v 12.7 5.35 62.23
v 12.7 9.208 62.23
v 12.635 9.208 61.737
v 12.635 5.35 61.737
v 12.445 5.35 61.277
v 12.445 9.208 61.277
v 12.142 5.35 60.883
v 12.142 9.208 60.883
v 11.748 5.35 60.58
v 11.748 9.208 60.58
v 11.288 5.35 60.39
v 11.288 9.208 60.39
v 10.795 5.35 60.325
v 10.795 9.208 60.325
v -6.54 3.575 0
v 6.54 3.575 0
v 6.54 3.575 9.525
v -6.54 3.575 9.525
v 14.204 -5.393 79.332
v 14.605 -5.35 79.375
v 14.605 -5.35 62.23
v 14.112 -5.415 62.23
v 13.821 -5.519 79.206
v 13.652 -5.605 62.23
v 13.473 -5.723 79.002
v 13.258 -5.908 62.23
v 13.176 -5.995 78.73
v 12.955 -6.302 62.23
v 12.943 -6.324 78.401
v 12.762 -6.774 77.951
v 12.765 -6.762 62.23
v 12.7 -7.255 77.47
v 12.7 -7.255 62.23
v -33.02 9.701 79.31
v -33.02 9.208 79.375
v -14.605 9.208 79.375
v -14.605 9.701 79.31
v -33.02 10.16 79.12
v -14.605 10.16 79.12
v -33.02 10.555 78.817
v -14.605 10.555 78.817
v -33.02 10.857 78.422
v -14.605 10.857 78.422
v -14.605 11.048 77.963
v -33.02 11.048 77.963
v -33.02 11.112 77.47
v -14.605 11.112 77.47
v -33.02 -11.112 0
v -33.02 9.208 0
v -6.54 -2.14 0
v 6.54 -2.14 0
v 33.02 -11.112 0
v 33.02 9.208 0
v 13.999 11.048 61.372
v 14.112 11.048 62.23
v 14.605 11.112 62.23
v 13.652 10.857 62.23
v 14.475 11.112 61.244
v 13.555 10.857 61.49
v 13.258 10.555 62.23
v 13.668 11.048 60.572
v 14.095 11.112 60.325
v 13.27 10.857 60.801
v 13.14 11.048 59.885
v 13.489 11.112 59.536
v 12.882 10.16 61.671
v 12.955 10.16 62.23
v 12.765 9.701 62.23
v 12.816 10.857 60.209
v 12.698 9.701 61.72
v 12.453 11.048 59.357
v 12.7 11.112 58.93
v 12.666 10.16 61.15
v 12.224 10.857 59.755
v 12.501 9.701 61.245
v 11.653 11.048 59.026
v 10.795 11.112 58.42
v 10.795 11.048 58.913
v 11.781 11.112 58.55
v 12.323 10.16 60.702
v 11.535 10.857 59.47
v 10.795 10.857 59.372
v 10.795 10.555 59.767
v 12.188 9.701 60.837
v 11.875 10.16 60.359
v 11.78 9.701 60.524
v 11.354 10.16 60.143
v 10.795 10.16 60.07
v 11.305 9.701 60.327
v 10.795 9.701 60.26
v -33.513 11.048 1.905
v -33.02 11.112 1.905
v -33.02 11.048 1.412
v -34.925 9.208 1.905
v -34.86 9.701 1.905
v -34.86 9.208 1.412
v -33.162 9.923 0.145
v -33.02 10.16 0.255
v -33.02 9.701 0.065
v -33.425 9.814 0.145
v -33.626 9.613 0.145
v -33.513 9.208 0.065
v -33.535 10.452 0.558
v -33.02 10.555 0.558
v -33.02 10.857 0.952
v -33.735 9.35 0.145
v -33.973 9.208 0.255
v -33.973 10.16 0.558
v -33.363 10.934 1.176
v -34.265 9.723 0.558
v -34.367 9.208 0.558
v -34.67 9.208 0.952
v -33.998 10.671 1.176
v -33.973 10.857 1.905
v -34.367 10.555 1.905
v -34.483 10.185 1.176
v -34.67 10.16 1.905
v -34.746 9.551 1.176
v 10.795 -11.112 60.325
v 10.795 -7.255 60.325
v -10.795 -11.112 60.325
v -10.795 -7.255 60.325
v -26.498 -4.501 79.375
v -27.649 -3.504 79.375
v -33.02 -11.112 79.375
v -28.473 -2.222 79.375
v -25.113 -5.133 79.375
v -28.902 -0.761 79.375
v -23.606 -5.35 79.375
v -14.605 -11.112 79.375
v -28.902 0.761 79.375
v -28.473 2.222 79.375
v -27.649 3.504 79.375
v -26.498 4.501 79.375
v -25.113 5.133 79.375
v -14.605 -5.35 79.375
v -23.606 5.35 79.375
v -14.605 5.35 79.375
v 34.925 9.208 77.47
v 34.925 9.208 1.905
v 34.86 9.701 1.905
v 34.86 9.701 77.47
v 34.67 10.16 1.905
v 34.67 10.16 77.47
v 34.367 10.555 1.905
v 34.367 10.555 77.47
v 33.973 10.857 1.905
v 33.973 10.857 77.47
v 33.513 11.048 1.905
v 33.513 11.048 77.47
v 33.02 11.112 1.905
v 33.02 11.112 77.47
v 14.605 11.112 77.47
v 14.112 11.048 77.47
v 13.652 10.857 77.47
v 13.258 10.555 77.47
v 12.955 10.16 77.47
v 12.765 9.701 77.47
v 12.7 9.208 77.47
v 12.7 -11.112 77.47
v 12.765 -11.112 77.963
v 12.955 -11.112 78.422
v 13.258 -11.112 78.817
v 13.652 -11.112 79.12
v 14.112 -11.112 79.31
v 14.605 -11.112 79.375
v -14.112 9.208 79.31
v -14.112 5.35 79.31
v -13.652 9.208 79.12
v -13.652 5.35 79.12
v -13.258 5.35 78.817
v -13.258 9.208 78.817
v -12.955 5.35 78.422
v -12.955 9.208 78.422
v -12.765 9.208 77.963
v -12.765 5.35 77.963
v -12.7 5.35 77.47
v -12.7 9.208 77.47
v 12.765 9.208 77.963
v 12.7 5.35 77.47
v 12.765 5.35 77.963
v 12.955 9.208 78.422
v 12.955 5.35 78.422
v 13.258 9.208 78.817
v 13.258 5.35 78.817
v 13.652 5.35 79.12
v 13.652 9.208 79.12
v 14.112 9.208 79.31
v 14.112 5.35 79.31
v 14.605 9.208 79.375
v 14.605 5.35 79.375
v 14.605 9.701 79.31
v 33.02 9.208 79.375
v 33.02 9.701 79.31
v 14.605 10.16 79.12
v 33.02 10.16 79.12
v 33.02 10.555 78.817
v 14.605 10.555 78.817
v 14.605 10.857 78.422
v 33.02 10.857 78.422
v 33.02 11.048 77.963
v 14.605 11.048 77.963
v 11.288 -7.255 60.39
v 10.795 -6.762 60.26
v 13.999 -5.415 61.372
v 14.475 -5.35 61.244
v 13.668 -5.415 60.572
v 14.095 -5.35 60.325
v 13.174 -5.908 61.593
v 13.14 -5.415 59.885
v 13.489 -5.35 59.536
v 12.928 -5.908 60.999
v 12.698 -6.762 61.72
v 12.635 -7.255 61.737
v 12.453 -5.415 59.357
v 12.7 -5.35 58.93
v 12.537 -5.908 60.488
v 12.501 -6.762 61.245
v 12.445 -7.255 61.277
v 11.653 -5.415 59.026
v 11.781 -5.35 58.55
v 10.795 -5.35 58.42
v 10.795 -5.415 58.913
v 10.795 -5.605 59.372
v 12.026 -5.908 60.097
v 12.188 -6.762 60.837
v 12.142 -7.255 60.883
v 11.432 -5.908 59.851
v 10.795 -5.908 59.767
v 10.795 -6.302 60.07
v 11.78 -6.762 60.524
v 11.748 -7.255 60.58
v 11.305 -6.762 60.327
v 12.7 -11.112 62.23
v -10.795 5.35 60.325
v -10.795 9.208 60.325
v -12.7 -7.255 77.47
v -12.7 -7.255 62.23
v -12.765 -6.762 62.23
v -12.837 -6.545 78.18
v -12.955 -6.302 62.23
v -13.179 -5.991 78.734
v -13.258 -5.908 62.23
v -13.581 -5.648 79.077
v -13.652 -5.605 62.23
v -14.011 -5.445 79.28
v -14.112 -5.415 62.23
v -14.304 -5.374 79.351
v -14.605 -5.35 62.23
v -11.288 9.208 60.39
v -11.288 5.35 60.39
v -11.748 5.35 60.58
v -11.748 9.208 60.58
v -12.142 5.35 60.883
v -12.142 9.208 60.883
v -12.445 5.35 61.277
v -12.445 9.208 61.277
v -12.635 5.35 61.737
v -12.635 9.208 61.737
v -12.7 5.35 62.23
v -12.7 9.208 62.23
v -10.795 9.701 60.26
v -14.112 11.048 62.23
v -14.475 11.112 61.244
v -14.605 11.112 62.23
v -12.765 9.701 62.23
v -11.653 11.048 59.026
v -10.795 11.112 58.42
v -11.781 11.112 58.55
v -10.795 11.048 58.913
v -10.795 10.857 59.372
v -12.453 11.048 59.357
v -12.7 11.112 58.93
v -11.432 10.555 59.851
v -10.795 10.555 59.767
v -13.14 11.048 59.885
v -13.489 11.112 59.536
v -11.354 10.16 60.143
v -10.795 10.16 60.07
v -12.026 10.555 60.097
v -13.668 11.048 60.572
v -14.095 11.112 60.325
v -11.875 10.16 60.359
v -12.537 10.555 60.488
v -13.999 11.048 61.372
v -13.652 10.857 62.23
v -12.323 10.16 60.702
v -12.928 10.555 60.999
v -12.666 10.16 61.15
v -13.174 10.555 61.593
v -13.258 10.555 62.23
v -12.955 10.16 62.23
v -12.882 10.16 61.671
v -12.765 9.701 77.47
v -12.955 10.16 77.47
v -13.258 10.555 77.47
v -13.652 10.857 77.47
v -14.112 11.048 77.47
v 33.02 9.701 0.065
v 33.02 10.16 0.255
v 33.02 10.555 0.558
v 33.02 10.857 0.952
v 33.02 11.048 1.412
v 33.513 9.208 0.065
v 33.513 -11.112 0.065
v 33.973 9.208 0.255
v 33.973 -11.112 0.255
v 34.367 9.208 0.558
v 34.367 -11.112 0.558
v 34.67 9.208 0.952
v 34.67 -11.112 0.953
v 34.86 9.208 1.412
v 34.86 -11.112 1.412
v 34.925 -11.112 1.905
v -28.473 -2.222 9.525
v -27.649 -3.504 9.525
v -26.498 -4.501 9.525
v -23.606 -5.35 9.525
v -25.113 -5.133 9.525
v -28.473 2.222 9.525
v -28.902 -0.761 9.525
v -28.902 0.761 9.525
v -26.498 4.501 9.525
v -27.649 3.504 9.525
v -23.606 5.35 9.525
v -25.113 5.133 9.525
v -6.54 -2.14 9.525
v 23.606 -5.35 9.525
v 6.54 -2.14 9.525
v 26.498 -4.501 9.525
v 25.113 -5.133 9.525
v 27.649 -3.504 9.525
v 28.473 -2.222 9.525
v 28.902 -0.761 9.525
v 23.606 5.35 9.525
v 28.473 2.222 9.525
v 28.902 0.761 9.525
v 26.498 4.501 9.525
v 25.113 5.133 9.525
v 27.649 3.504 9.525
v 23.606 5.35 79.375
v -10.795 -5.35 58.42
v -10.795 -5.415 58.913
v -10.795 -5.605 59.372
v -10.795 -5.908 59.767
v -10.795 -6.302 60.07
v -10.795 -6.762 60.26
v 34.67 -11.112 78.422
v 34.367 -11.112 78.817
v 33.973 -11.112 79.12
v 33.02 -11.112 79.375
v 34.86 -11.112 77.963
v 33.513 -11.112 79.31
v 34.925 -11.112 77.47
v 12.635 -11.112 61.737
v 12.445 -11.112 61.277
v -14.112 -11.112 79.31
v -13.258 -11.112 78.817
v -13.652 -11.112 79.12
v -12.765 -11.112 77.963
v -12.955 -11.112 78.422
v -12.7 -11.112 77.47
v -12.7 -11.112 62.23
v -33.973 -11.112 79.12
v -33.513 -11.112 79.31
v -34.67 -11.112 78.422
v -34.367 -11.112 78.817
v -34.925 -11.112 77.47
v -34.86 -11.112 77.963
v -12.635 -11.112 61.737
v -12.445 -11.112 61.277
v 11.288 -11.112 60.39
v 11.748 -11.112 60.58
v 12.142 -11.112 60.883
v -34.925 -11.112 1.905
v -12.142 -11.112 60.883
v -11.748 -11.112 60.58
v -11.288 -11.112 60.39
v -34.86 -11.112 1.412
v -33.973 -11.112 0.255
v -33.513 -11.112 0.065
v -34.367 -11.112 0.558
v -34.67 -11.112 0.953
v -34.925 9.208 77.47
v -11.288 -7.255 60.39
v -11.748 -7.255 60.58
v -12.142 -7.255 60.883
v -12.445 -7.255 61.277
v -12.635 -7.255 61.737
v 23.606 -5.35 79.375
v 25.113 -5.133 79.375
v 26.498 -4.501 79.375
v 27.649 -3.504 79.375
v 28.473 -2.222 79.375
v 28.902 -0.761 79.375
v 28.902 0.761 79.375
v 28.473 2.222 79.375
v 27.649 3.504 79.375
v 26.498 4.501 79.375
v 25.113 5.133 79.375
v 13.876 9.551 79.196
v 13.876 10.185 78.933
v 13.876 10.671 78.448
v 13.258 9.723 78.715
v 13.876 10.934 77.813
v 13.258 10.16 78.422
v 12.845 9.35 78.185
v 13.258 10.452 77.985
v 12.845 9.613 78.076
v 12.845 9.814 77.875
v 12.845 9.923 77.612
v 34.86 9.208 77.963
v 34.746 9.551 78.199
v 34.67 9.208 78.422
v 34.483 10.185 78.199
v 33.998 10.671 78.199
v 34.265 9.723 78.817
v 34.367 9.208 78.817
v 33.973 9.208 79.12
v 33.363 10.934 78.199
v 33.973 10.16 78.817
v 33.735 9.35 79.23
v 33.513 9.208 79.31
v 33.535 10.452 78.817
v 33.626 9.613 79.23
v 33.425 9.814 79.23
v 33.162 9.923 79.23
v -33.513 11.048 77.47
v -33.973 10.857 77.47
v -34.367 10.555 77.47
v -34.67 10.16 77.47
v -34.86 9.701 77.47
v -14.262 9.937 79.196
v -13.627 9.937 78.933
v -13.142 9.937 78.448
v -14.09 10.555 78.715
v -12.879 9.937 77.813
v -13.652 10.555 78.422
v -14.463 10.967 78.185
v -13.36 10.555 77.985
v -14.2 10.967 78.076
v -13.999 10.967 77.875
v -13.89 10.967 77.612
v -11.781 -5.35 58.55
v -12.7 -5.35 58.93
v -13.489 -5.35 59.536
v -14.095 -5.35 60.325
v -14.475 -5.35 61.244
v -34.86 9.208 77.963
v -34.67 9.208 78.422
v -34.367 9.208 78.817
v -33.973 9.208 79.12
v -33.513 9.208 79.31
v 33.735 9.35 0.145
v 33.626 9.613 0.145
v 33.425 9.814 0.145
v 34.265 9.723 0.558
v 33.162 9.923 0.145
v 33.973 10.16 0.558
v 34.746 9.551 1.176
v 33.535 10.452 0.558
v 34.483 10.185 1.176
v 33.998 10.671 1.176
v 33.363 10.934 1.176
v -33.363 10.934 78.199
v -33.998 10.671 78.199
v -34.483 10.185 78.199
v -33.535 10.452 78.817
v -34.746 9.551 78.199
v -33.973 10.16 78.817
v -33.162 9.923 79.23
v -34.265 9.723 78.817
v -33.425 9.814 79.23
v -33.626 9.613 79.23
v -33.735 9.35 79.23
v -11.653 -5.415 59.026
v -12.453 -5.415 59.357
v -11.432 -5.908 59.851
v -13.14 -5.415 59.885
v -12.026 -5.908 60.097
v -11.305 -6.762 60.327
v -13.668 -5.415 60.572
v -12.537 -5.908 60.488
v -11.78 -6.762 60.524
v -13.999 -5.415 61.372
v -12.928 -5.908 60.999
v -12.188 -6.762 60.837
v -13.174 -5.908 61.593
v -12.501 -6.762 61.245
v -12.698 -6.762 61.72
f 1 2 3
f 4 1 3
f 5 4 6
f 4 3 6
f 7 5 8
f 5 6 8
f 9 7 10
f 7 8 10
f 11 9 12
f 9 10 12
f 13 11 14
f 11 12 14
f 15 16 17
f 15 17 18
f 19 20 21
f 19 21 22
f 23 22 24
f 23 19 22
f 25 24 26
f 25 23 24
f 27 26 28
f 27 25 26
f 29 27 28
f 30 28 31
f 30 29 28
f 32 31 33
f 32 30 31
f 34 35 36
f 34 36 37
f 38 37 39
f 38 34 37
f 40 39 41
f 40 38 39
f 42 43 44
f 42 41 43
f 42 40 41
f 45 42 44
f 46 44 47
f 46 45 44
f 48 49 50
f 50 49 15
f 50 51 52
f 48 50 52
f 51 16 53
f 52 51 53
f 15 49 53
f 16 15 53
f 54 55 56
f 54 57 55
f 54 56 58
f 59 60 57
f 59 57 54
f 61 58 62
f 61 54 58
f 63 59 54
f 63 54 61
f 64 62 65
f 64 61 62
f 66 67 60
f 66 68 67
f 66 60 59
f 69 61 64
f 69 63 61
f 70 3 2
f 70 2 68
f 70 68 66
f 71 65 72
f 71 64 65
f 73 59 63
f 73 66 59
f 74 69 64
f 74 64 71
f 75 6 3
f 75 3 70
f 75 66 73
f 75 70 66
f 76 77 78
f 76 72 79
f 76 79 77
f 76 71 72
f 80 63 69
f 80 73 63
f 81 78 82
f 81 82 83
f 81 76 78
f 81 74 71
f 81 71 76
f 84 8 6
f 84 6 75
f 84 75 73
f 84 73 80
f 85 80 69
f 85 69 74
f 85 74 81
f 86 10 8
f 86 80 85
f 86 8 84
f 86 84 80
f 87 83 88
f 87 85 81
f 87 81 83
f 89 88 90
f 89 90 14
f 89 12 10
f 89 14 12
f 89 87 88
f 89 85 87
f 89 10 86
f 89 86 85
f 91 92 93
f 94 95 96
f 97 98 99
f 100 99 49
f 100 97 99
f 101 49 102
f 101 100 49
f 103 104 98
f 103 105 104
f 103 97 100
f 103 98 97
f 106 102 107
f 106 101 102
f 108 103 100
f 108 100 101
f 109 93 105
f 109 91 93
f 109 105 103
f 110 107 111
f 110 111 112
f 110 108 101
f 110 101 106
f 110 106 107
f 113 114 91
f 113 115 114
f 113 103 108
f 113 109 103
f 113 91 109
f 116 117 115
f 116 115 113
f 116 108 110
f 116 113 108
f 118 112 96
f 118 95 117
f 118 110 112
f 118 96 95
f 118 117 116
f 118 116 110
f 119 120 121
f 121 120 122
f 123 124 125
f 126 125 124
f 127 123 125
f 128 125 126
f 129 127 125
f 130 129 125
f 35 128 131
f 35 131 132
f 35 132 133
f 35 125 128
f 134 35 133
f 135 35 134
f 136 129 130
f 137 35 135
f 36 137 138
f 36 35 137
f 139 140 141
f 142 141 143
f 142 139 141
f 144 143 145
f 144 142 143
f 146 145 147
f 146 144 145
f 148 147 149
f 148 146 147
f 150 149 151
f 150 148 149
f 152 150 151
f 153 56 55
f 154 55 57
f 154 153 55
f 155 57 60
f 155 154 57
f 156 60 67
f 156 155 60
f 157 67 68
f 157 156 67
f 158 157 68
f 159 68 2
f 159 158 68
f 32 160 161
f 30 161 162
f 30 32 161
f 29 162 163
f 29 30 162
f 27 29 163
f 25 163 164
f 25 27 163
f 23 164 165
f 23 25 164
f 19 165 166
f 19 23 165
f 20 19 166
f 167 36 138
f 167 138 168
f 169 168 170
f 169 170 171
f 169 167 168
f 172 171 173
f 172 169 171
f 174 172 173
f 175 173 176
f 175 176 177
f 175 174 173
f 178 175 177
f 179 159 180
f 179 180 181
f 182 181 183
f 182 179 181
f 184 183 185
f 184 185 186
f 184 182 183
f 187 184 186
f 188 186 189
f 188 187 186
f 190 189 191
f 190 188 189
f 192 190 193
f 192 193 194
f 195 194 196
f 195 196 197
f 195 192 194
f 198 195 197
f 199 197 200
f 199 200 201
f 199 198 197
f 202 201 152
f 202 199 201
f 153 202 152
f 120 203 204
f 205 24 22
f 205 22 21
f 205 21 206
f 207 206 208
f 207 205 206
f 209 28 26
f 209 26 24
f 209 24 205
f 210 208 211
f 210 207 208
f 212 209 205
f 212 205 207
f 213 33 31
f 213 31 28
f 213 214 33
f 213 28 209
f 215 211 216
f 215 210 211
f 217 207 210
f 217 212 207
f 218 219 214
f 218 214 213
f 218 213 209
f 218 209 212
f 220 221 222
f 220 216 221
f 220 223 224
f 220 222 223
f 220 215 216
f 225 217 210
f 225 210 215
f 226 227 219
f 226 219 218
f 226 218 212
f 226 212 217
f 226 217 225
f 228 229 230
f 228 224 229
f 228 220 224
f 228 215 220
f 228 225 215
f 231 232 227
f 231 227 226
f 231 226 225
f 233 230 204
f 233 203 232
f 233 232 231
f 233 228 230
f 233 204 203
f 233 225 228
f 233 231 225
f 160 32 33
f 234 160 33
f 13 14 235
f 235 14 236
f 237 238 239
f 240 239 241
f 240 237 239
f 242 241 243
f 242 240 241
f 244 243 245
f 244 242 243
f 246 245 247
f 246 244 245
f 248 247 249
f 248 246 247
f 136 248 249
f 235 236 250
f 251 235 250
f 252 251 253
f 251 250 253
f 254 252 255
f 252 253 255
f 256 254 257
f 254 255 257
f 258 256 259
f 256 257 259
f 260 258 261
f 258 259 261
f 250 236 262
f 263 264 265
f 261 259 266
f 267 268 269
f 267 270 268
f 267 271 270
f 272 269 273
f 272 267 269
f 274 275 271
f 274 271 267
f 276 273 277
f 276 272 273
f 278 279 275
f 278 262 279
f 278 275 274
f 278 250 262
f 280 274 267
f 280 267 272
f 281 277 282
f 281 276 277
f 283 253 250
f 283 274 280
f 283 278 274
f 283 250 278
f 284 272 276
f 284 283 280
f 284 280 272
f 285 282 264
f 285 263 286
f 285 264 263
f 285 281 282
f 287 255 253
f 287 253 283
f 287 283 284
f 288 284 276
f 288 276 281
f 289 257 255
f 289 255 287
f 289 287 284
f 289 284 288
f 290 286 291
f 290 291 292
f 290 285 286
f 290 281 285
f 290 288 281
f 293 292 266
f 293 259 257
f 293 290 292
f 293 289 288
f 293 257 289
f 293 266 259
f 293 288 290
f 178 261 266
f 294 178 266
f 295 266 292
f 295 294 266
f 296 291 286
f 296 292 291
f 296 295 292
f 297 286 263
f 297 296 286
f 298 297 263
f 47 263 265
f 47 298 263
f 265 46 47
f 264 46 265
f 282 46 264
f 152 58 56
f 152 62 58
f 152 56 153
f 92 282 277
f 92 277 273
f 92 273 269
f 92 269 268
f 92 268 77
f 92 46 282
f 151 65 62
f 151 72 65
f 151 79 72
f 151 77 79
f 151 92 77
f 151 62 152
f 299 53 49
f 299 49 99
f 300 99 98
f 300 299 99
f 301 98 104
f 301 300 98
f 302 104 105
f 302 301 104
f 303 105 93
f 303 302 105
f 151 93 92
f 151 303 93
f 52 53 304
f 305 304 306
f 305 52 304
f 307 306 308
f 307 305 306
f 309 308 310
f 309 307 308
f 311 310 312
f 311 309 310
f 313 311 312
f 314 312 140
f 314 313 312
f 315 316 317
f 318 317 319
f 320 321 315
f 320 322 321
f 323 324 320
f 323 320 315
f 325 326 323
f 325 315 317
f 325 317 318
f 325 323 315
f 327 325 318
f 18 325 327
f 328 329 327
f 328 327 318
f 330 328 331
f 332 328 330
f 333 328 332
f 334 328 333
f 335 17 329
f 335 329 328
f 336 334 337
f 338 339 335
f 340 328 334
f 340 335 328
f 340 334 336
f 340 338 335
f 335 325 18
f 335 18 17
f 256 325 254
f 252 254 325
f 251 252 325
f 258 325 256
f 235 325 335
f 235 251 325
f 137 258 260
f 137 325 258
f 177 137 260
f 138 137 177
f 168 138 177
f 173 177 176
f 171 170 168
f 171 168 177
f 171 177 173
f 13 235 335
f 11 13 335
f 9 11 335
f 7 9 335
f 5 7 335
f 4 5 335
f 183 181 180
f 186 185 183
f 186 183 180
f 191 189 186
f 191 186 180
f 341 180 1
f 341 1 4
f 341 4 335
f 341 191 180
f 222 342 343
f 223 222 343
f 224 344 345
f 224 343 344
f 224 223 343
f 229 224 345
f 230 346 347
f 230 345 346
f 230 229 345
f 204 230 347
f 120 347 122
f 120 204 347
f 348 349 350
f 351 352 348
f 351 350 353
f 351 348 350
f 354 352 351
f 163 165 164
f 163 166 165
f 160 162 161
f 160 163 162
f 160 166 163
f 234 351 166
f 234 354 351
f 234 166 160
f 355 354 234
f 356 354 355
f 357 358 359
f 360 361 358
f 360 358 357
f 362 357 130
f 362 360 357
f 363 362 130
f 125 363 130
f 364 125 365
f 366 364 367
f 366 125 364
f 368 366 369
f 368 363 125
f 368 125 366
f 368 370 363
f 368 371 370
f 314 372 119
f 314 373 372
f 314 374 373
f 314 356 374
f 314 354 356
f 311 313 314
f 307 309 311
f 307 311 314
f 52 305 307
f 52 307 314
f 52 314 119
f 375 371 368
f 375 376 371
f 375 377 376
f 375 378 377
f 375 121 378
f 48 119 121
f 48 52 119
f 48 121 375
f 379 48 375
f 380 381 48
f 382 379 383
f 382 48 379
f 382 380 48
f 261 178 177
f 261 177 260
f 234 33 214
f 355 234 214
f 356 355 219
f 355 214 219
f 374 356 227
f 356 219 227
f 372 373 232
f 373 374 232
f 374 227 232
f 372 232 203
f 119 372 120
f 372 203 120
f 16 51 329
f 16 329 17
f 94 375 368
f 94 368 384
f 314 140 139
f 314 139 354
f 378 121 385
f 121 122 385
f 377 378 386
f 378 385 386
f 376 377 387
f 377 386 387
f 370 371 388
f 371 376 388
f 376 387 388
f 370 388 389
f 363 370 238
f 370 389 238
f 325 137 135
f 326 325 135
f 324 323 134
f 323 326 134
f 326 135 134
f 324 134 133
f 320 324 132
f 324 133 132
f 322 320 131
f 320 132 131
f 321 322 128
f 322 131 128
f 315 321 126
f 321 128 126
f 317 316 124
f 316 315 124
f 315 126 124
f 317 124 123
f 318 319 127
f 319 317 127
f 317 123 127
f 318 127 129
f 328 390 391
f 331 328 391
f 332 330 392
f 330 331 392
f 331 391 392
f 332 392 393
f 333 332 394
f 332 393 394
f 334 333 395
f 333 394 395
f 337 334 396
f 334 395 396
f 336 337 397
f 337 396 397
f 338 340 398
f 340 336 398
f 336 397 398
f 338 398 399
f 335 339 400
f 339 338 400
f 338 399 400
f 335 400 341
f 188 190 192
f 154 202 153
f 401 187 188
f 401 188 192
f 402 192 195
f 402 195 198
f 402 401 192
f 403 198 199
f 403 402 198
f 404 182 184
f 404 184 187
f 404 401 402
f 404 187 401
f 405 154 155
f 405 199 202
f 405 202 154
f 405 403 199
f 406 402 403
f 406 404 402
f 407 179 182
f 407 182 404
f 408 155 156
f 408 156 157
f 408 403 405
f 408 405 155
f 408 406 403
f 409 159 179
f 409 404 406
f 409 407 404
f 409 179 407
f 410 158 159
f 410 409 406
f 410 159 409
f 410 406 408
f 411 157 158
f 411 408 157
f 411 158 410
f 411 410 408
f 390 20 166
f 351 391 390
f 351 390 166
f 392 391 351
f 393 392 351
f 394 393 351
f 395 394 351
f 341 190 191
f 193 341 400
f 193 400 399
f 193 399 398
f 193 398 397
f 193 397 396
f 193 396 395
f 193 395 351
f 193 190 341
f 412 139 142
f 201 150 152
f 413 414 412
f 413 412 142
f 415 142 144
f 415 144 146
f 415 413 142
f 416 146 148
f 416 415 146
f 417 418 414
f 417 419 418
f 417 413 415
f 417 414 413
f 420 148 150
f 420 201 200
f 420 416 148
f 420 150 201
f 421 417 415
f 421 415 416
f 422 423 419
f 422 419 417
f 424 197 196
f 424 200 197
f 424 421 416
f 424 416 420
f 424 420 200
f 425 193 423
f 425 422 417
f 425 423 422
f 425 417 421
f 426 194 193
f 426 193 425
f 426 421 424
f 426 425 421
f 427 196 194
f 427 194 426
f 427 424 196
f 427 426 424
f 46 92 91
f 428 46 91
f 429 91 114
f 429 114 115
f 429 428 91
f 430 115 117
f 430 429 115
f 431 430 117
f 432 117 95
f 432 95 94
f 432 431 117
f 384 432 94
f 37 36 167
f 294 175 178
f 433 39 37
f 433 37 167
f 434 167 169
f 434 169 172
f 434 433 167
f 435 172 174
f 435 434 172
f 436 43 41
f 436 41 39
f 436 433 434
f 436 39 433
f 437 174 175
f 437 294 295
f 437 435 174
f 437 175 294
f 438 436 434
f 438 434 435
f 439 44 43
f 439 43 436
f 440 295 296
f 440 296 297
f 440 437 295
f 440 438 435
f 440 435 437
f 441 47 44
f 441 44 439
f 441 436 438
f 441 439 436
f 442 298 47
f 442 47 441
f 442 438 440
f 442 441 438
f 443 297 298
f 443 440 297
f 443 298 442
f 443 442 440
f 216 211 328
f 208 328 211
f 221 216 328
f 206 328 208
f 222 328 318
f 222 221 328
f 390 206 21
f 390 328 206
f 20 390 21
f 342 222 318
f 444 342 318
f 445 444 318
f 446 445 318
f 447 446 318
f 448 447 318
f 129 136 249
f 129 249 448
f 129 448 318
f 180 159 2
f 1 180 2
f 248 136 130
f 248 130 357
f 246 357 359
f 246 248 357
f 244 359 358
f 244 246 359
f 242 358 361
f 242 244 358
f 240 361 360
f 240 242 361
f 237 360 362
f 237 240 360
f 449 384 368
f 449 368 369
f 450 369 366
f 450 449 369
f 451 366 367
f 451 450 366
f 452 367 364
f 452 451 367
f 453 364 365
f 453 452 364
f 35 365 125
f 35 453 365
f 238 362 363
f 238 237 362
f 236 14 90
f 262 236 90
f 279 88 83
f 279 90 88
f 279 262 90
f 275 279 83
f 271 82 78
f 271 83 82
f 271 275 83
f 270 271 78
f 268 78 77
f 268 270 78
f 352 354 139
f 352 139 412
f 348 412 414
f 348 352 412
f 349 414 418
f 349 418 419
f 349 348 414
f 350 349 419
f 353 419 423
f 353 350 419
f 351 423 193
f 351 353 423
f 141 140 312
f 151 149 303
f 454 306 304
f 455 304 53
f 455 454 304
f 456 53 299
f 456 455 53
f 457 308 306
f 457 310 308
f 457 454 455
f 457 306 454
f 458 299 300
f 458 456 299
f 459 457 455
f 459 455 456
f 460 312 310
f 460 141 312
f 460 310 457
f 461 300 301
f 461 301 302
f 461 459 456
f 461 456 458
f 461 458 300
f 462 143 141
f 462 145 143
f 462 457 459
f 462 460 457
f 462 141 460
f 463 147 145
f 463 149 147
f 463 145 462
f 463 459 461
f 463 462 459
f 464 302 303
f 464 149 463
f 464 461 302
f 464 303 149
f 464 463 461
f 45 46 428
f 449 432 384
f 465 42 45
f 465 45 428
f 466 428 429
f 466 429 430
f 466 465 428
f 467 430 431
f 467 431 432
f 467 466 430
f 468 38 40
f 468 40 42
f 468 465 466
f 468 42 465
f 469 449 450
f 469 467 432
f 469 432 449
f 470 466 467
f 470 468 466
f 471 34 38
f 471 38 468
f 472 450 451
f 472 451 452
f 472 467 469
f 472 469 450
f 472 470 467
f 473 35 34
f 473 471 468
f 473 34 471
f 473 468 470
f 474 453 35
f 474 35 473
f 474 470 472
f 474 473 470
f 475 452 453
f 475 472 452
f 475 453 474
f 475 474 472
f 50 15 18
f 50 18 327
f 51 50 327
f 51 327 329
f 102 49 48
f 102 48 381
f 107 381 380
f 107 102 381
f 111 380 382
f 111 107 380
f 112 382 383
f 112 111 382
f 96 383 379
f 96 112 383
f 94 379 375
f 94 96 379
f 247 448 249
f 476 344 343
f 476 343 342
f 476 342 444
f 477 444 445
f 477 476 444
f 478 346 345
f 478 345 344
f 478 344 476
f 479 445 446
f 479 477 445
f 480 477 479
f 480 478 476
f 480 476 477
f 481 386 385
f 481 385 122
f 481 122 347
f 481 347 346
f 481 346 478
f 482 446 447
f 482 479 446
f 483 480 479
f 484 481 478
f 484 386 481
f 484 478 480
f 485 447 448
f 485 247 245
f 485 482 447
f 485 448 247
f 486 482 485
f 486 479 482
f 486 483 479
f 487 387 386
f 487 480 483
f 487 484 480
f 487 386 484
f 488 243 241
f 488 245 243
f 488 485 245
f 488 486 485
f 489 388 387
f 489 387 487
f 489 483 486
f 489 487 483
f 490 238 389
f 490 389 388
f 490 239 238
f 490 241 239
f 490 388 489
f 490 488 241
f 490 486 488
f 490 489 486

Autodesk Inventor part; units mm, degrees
ref_plane "YZ Plane" through (0, 0, 0) normal (1, 0, 0) x (0, 1, 0)
ref_plane "XZ Plane" through (0, 0, 0) normal (0, 1, 0) x (-1, 0, 0)
ref_plane "XY Plane" through (0, 0, 0) normal (0, 0, 1) x (1, 0, 0)
sketch "Sketch1" plane through (0, 0, 0) normal (0, 0, 1) x (1, 0, 0)
  line L0 (34.925, -11.1125) -> (-34.925, -11.1125)
  line L1 (-34.925, -11.1125) -> (-34.925, 11.1125)
  line L2 (-34.925, 11.1125) -> (34.925, 11.1125)
  line L3 (34.925, 11.1125) -> (34.925, -11.1125)
  line L4 (34.925, -11.1125) -> (-34.925, 11.1125) construction
  line L5 (-34.925, -11.1125) -> (34.925, 11.1125) construction
  point P0 (0, 0)
  dimension "d0" = 69.85
  dimension "d1" = 22.225
extrude "Extrusion1" add sketch "Sketch1" along normal blind 79.375
sketch "Sketch2" plane through (0, 0, 79.375) normal (0, 0, 1) x (1, 0, 0)
  line L0 (23.606, -5.35) -> (-23.606, -5.35)
  line L1 (-28.956, 0) -> (-28.956, 0)
  line L2 (-23.606, 5.35) -> (23.606, 5.35)
  line L3 (28.956, 0) -> (28.956, 0)
  line L4 (28.956, -5.35) -> (-28.956, 5.35) construction
  line L5 (-28.956, -5.35) -> (28.956, 5.35) construction
  arc A0 (-23.606, 5.35) -> (-28.956, 0) centre (-23.606, 0) ccw
  arc A1 (-28.956, 0) -> (-23.606, -5.35) centre (-23.606, 0) ccw
  arc A2 (28.956, 0) -> (23.606, 5.35) centre (23.606, 0) ccw
  arc A3 (23.606, -5.35) -> (28.956, 0) centre (23.606, 0) ccw
  point P0 (0, 0)
  point P1 (28.956, 0)
  point P2 (-28.956, 0)
  dimension "d5" = 57.912
  dimension "d6" = 10.7
  dimension "d9" = 5.35
extrude "Extrusion2" cut sketch "Sketch2" against normal blind 69.85
fillet "Fillet1" radius 1.905 7 edges at (-34.925, 0, 79.375) (-34.925, 11.1125, 39.6875) (34.925, 0, 79.375) (34.925, 11.1125, 39.6875) (34.925, 0, 0) (0, 11.1125, 0) (-34.925, 0, 0)
sketch "Sketch3" plane through (0, 0, 0) normal (0, 0, -1) x (-1, 0, 0)
  line L0 (-23.606, -5.35) -> (23.606, -5.35) projected
  arc A0 (23.606, -5.35) -> (23.606, 5.35) centre (23.606, 0) ccw projected
  line L1 (23.606, 5.35) -> (-23.606, 5.35) projected
  arc A1 (-23.606, 5.35) -> (-23.606, -5.35) centre (-23.606, 0) ccw projected
  line L2 (6.5405, -2.1403) -> (-6.5405, -2.1403)
  line L3 (-6.5405, -2.1403) -> (-6.5405, 3.5747)
  line L4 (-6.5405, 3.5747) -> (6.5405, 3.5747)
  line L5 (6.5405, 3.5747) -> (6.5405, -2.1403)
  line L6 (6.5405, -2.1403) -> (-6.5405, 3.5747) construction
  line L7 (-6.5405, -2.1403) -> (6.5405, 3.5747) construction
  line L8 (33.02, 9.2075) -> (-33.02, 9.2075) projected
  line L9 (0, 9.2075) -> (0, -11.1125)
  line L10 (33.02, -11.1125) -> (-33.02, -11.1125) projected
  point P0 (0, 0)
  point P1 (0, 0.7172)
  dimension "d10" = 13.081
  dimension "d11" = 5.715
  dimension "d13" = 4.6328
extrude "Extrusion3" cut sketch "Sketch3" against normal through all contours L9 L4 L5 L2 | L2 L3 L4 L9
sketch "Sketch5" plane through (-33.02, 11.1125, 79.375) normal (0, 1, 0) x (1, 0, 0)
  line L0 (33.02, 79.375) -> (33.02, 0)
  line L1 (20.32, 0) -> (20.32, 19.05)
  line L2 (20.32, 19.05) -> (33.02, 19.05)
  line L3 (20.32, 0) -> (33.02, 0)
  line L4 (66.04, 0) -> (0, 0) projected
  line L5 (45.72, 0) -> (45.72, 19.05)
  line L6 (45.72, 19.05) -> (33.02, 19.05)
  line L7 (45.72, 0) -> (33.02, 0)
  point P0 (33.02, 0)
  point P1 (45.72, 0)
  dimension "d22" = 19.05
  dimension "d23" = 12.7
extrude "Extrusion5" cut sketch "Sketch5" against normal through all
fillet "Fillet3" radius 1.905 18 edges at (-34.367, 10.5545, 78.817) (-22.86, 11.1125, 79.375) (-12.7, 11.1125, 69.85) (0, 11.1125, 60.325) (12.7, 11.1125, 69.85) (12.7, 8.2313, 79.375) (0, -5.35, 60.325) (-12.7, -5.35, 69.85) (12.7, -5.35, 69.85) (12.7, -8.2313, 79.375) (-12.7, -8.2313, 79.375) (34.367, 10.5545, 78.817) (22.86, 11.1125, 79.375) (-12.7, 8.2312, 79.375) (-12.7, 8.2312, 60.325) (12.7, -8.2313, 60.325) (12.7, 8.2313, 60.325) (-12.7, -8.2313, 60.325)
properties part number "_3DPrint"
